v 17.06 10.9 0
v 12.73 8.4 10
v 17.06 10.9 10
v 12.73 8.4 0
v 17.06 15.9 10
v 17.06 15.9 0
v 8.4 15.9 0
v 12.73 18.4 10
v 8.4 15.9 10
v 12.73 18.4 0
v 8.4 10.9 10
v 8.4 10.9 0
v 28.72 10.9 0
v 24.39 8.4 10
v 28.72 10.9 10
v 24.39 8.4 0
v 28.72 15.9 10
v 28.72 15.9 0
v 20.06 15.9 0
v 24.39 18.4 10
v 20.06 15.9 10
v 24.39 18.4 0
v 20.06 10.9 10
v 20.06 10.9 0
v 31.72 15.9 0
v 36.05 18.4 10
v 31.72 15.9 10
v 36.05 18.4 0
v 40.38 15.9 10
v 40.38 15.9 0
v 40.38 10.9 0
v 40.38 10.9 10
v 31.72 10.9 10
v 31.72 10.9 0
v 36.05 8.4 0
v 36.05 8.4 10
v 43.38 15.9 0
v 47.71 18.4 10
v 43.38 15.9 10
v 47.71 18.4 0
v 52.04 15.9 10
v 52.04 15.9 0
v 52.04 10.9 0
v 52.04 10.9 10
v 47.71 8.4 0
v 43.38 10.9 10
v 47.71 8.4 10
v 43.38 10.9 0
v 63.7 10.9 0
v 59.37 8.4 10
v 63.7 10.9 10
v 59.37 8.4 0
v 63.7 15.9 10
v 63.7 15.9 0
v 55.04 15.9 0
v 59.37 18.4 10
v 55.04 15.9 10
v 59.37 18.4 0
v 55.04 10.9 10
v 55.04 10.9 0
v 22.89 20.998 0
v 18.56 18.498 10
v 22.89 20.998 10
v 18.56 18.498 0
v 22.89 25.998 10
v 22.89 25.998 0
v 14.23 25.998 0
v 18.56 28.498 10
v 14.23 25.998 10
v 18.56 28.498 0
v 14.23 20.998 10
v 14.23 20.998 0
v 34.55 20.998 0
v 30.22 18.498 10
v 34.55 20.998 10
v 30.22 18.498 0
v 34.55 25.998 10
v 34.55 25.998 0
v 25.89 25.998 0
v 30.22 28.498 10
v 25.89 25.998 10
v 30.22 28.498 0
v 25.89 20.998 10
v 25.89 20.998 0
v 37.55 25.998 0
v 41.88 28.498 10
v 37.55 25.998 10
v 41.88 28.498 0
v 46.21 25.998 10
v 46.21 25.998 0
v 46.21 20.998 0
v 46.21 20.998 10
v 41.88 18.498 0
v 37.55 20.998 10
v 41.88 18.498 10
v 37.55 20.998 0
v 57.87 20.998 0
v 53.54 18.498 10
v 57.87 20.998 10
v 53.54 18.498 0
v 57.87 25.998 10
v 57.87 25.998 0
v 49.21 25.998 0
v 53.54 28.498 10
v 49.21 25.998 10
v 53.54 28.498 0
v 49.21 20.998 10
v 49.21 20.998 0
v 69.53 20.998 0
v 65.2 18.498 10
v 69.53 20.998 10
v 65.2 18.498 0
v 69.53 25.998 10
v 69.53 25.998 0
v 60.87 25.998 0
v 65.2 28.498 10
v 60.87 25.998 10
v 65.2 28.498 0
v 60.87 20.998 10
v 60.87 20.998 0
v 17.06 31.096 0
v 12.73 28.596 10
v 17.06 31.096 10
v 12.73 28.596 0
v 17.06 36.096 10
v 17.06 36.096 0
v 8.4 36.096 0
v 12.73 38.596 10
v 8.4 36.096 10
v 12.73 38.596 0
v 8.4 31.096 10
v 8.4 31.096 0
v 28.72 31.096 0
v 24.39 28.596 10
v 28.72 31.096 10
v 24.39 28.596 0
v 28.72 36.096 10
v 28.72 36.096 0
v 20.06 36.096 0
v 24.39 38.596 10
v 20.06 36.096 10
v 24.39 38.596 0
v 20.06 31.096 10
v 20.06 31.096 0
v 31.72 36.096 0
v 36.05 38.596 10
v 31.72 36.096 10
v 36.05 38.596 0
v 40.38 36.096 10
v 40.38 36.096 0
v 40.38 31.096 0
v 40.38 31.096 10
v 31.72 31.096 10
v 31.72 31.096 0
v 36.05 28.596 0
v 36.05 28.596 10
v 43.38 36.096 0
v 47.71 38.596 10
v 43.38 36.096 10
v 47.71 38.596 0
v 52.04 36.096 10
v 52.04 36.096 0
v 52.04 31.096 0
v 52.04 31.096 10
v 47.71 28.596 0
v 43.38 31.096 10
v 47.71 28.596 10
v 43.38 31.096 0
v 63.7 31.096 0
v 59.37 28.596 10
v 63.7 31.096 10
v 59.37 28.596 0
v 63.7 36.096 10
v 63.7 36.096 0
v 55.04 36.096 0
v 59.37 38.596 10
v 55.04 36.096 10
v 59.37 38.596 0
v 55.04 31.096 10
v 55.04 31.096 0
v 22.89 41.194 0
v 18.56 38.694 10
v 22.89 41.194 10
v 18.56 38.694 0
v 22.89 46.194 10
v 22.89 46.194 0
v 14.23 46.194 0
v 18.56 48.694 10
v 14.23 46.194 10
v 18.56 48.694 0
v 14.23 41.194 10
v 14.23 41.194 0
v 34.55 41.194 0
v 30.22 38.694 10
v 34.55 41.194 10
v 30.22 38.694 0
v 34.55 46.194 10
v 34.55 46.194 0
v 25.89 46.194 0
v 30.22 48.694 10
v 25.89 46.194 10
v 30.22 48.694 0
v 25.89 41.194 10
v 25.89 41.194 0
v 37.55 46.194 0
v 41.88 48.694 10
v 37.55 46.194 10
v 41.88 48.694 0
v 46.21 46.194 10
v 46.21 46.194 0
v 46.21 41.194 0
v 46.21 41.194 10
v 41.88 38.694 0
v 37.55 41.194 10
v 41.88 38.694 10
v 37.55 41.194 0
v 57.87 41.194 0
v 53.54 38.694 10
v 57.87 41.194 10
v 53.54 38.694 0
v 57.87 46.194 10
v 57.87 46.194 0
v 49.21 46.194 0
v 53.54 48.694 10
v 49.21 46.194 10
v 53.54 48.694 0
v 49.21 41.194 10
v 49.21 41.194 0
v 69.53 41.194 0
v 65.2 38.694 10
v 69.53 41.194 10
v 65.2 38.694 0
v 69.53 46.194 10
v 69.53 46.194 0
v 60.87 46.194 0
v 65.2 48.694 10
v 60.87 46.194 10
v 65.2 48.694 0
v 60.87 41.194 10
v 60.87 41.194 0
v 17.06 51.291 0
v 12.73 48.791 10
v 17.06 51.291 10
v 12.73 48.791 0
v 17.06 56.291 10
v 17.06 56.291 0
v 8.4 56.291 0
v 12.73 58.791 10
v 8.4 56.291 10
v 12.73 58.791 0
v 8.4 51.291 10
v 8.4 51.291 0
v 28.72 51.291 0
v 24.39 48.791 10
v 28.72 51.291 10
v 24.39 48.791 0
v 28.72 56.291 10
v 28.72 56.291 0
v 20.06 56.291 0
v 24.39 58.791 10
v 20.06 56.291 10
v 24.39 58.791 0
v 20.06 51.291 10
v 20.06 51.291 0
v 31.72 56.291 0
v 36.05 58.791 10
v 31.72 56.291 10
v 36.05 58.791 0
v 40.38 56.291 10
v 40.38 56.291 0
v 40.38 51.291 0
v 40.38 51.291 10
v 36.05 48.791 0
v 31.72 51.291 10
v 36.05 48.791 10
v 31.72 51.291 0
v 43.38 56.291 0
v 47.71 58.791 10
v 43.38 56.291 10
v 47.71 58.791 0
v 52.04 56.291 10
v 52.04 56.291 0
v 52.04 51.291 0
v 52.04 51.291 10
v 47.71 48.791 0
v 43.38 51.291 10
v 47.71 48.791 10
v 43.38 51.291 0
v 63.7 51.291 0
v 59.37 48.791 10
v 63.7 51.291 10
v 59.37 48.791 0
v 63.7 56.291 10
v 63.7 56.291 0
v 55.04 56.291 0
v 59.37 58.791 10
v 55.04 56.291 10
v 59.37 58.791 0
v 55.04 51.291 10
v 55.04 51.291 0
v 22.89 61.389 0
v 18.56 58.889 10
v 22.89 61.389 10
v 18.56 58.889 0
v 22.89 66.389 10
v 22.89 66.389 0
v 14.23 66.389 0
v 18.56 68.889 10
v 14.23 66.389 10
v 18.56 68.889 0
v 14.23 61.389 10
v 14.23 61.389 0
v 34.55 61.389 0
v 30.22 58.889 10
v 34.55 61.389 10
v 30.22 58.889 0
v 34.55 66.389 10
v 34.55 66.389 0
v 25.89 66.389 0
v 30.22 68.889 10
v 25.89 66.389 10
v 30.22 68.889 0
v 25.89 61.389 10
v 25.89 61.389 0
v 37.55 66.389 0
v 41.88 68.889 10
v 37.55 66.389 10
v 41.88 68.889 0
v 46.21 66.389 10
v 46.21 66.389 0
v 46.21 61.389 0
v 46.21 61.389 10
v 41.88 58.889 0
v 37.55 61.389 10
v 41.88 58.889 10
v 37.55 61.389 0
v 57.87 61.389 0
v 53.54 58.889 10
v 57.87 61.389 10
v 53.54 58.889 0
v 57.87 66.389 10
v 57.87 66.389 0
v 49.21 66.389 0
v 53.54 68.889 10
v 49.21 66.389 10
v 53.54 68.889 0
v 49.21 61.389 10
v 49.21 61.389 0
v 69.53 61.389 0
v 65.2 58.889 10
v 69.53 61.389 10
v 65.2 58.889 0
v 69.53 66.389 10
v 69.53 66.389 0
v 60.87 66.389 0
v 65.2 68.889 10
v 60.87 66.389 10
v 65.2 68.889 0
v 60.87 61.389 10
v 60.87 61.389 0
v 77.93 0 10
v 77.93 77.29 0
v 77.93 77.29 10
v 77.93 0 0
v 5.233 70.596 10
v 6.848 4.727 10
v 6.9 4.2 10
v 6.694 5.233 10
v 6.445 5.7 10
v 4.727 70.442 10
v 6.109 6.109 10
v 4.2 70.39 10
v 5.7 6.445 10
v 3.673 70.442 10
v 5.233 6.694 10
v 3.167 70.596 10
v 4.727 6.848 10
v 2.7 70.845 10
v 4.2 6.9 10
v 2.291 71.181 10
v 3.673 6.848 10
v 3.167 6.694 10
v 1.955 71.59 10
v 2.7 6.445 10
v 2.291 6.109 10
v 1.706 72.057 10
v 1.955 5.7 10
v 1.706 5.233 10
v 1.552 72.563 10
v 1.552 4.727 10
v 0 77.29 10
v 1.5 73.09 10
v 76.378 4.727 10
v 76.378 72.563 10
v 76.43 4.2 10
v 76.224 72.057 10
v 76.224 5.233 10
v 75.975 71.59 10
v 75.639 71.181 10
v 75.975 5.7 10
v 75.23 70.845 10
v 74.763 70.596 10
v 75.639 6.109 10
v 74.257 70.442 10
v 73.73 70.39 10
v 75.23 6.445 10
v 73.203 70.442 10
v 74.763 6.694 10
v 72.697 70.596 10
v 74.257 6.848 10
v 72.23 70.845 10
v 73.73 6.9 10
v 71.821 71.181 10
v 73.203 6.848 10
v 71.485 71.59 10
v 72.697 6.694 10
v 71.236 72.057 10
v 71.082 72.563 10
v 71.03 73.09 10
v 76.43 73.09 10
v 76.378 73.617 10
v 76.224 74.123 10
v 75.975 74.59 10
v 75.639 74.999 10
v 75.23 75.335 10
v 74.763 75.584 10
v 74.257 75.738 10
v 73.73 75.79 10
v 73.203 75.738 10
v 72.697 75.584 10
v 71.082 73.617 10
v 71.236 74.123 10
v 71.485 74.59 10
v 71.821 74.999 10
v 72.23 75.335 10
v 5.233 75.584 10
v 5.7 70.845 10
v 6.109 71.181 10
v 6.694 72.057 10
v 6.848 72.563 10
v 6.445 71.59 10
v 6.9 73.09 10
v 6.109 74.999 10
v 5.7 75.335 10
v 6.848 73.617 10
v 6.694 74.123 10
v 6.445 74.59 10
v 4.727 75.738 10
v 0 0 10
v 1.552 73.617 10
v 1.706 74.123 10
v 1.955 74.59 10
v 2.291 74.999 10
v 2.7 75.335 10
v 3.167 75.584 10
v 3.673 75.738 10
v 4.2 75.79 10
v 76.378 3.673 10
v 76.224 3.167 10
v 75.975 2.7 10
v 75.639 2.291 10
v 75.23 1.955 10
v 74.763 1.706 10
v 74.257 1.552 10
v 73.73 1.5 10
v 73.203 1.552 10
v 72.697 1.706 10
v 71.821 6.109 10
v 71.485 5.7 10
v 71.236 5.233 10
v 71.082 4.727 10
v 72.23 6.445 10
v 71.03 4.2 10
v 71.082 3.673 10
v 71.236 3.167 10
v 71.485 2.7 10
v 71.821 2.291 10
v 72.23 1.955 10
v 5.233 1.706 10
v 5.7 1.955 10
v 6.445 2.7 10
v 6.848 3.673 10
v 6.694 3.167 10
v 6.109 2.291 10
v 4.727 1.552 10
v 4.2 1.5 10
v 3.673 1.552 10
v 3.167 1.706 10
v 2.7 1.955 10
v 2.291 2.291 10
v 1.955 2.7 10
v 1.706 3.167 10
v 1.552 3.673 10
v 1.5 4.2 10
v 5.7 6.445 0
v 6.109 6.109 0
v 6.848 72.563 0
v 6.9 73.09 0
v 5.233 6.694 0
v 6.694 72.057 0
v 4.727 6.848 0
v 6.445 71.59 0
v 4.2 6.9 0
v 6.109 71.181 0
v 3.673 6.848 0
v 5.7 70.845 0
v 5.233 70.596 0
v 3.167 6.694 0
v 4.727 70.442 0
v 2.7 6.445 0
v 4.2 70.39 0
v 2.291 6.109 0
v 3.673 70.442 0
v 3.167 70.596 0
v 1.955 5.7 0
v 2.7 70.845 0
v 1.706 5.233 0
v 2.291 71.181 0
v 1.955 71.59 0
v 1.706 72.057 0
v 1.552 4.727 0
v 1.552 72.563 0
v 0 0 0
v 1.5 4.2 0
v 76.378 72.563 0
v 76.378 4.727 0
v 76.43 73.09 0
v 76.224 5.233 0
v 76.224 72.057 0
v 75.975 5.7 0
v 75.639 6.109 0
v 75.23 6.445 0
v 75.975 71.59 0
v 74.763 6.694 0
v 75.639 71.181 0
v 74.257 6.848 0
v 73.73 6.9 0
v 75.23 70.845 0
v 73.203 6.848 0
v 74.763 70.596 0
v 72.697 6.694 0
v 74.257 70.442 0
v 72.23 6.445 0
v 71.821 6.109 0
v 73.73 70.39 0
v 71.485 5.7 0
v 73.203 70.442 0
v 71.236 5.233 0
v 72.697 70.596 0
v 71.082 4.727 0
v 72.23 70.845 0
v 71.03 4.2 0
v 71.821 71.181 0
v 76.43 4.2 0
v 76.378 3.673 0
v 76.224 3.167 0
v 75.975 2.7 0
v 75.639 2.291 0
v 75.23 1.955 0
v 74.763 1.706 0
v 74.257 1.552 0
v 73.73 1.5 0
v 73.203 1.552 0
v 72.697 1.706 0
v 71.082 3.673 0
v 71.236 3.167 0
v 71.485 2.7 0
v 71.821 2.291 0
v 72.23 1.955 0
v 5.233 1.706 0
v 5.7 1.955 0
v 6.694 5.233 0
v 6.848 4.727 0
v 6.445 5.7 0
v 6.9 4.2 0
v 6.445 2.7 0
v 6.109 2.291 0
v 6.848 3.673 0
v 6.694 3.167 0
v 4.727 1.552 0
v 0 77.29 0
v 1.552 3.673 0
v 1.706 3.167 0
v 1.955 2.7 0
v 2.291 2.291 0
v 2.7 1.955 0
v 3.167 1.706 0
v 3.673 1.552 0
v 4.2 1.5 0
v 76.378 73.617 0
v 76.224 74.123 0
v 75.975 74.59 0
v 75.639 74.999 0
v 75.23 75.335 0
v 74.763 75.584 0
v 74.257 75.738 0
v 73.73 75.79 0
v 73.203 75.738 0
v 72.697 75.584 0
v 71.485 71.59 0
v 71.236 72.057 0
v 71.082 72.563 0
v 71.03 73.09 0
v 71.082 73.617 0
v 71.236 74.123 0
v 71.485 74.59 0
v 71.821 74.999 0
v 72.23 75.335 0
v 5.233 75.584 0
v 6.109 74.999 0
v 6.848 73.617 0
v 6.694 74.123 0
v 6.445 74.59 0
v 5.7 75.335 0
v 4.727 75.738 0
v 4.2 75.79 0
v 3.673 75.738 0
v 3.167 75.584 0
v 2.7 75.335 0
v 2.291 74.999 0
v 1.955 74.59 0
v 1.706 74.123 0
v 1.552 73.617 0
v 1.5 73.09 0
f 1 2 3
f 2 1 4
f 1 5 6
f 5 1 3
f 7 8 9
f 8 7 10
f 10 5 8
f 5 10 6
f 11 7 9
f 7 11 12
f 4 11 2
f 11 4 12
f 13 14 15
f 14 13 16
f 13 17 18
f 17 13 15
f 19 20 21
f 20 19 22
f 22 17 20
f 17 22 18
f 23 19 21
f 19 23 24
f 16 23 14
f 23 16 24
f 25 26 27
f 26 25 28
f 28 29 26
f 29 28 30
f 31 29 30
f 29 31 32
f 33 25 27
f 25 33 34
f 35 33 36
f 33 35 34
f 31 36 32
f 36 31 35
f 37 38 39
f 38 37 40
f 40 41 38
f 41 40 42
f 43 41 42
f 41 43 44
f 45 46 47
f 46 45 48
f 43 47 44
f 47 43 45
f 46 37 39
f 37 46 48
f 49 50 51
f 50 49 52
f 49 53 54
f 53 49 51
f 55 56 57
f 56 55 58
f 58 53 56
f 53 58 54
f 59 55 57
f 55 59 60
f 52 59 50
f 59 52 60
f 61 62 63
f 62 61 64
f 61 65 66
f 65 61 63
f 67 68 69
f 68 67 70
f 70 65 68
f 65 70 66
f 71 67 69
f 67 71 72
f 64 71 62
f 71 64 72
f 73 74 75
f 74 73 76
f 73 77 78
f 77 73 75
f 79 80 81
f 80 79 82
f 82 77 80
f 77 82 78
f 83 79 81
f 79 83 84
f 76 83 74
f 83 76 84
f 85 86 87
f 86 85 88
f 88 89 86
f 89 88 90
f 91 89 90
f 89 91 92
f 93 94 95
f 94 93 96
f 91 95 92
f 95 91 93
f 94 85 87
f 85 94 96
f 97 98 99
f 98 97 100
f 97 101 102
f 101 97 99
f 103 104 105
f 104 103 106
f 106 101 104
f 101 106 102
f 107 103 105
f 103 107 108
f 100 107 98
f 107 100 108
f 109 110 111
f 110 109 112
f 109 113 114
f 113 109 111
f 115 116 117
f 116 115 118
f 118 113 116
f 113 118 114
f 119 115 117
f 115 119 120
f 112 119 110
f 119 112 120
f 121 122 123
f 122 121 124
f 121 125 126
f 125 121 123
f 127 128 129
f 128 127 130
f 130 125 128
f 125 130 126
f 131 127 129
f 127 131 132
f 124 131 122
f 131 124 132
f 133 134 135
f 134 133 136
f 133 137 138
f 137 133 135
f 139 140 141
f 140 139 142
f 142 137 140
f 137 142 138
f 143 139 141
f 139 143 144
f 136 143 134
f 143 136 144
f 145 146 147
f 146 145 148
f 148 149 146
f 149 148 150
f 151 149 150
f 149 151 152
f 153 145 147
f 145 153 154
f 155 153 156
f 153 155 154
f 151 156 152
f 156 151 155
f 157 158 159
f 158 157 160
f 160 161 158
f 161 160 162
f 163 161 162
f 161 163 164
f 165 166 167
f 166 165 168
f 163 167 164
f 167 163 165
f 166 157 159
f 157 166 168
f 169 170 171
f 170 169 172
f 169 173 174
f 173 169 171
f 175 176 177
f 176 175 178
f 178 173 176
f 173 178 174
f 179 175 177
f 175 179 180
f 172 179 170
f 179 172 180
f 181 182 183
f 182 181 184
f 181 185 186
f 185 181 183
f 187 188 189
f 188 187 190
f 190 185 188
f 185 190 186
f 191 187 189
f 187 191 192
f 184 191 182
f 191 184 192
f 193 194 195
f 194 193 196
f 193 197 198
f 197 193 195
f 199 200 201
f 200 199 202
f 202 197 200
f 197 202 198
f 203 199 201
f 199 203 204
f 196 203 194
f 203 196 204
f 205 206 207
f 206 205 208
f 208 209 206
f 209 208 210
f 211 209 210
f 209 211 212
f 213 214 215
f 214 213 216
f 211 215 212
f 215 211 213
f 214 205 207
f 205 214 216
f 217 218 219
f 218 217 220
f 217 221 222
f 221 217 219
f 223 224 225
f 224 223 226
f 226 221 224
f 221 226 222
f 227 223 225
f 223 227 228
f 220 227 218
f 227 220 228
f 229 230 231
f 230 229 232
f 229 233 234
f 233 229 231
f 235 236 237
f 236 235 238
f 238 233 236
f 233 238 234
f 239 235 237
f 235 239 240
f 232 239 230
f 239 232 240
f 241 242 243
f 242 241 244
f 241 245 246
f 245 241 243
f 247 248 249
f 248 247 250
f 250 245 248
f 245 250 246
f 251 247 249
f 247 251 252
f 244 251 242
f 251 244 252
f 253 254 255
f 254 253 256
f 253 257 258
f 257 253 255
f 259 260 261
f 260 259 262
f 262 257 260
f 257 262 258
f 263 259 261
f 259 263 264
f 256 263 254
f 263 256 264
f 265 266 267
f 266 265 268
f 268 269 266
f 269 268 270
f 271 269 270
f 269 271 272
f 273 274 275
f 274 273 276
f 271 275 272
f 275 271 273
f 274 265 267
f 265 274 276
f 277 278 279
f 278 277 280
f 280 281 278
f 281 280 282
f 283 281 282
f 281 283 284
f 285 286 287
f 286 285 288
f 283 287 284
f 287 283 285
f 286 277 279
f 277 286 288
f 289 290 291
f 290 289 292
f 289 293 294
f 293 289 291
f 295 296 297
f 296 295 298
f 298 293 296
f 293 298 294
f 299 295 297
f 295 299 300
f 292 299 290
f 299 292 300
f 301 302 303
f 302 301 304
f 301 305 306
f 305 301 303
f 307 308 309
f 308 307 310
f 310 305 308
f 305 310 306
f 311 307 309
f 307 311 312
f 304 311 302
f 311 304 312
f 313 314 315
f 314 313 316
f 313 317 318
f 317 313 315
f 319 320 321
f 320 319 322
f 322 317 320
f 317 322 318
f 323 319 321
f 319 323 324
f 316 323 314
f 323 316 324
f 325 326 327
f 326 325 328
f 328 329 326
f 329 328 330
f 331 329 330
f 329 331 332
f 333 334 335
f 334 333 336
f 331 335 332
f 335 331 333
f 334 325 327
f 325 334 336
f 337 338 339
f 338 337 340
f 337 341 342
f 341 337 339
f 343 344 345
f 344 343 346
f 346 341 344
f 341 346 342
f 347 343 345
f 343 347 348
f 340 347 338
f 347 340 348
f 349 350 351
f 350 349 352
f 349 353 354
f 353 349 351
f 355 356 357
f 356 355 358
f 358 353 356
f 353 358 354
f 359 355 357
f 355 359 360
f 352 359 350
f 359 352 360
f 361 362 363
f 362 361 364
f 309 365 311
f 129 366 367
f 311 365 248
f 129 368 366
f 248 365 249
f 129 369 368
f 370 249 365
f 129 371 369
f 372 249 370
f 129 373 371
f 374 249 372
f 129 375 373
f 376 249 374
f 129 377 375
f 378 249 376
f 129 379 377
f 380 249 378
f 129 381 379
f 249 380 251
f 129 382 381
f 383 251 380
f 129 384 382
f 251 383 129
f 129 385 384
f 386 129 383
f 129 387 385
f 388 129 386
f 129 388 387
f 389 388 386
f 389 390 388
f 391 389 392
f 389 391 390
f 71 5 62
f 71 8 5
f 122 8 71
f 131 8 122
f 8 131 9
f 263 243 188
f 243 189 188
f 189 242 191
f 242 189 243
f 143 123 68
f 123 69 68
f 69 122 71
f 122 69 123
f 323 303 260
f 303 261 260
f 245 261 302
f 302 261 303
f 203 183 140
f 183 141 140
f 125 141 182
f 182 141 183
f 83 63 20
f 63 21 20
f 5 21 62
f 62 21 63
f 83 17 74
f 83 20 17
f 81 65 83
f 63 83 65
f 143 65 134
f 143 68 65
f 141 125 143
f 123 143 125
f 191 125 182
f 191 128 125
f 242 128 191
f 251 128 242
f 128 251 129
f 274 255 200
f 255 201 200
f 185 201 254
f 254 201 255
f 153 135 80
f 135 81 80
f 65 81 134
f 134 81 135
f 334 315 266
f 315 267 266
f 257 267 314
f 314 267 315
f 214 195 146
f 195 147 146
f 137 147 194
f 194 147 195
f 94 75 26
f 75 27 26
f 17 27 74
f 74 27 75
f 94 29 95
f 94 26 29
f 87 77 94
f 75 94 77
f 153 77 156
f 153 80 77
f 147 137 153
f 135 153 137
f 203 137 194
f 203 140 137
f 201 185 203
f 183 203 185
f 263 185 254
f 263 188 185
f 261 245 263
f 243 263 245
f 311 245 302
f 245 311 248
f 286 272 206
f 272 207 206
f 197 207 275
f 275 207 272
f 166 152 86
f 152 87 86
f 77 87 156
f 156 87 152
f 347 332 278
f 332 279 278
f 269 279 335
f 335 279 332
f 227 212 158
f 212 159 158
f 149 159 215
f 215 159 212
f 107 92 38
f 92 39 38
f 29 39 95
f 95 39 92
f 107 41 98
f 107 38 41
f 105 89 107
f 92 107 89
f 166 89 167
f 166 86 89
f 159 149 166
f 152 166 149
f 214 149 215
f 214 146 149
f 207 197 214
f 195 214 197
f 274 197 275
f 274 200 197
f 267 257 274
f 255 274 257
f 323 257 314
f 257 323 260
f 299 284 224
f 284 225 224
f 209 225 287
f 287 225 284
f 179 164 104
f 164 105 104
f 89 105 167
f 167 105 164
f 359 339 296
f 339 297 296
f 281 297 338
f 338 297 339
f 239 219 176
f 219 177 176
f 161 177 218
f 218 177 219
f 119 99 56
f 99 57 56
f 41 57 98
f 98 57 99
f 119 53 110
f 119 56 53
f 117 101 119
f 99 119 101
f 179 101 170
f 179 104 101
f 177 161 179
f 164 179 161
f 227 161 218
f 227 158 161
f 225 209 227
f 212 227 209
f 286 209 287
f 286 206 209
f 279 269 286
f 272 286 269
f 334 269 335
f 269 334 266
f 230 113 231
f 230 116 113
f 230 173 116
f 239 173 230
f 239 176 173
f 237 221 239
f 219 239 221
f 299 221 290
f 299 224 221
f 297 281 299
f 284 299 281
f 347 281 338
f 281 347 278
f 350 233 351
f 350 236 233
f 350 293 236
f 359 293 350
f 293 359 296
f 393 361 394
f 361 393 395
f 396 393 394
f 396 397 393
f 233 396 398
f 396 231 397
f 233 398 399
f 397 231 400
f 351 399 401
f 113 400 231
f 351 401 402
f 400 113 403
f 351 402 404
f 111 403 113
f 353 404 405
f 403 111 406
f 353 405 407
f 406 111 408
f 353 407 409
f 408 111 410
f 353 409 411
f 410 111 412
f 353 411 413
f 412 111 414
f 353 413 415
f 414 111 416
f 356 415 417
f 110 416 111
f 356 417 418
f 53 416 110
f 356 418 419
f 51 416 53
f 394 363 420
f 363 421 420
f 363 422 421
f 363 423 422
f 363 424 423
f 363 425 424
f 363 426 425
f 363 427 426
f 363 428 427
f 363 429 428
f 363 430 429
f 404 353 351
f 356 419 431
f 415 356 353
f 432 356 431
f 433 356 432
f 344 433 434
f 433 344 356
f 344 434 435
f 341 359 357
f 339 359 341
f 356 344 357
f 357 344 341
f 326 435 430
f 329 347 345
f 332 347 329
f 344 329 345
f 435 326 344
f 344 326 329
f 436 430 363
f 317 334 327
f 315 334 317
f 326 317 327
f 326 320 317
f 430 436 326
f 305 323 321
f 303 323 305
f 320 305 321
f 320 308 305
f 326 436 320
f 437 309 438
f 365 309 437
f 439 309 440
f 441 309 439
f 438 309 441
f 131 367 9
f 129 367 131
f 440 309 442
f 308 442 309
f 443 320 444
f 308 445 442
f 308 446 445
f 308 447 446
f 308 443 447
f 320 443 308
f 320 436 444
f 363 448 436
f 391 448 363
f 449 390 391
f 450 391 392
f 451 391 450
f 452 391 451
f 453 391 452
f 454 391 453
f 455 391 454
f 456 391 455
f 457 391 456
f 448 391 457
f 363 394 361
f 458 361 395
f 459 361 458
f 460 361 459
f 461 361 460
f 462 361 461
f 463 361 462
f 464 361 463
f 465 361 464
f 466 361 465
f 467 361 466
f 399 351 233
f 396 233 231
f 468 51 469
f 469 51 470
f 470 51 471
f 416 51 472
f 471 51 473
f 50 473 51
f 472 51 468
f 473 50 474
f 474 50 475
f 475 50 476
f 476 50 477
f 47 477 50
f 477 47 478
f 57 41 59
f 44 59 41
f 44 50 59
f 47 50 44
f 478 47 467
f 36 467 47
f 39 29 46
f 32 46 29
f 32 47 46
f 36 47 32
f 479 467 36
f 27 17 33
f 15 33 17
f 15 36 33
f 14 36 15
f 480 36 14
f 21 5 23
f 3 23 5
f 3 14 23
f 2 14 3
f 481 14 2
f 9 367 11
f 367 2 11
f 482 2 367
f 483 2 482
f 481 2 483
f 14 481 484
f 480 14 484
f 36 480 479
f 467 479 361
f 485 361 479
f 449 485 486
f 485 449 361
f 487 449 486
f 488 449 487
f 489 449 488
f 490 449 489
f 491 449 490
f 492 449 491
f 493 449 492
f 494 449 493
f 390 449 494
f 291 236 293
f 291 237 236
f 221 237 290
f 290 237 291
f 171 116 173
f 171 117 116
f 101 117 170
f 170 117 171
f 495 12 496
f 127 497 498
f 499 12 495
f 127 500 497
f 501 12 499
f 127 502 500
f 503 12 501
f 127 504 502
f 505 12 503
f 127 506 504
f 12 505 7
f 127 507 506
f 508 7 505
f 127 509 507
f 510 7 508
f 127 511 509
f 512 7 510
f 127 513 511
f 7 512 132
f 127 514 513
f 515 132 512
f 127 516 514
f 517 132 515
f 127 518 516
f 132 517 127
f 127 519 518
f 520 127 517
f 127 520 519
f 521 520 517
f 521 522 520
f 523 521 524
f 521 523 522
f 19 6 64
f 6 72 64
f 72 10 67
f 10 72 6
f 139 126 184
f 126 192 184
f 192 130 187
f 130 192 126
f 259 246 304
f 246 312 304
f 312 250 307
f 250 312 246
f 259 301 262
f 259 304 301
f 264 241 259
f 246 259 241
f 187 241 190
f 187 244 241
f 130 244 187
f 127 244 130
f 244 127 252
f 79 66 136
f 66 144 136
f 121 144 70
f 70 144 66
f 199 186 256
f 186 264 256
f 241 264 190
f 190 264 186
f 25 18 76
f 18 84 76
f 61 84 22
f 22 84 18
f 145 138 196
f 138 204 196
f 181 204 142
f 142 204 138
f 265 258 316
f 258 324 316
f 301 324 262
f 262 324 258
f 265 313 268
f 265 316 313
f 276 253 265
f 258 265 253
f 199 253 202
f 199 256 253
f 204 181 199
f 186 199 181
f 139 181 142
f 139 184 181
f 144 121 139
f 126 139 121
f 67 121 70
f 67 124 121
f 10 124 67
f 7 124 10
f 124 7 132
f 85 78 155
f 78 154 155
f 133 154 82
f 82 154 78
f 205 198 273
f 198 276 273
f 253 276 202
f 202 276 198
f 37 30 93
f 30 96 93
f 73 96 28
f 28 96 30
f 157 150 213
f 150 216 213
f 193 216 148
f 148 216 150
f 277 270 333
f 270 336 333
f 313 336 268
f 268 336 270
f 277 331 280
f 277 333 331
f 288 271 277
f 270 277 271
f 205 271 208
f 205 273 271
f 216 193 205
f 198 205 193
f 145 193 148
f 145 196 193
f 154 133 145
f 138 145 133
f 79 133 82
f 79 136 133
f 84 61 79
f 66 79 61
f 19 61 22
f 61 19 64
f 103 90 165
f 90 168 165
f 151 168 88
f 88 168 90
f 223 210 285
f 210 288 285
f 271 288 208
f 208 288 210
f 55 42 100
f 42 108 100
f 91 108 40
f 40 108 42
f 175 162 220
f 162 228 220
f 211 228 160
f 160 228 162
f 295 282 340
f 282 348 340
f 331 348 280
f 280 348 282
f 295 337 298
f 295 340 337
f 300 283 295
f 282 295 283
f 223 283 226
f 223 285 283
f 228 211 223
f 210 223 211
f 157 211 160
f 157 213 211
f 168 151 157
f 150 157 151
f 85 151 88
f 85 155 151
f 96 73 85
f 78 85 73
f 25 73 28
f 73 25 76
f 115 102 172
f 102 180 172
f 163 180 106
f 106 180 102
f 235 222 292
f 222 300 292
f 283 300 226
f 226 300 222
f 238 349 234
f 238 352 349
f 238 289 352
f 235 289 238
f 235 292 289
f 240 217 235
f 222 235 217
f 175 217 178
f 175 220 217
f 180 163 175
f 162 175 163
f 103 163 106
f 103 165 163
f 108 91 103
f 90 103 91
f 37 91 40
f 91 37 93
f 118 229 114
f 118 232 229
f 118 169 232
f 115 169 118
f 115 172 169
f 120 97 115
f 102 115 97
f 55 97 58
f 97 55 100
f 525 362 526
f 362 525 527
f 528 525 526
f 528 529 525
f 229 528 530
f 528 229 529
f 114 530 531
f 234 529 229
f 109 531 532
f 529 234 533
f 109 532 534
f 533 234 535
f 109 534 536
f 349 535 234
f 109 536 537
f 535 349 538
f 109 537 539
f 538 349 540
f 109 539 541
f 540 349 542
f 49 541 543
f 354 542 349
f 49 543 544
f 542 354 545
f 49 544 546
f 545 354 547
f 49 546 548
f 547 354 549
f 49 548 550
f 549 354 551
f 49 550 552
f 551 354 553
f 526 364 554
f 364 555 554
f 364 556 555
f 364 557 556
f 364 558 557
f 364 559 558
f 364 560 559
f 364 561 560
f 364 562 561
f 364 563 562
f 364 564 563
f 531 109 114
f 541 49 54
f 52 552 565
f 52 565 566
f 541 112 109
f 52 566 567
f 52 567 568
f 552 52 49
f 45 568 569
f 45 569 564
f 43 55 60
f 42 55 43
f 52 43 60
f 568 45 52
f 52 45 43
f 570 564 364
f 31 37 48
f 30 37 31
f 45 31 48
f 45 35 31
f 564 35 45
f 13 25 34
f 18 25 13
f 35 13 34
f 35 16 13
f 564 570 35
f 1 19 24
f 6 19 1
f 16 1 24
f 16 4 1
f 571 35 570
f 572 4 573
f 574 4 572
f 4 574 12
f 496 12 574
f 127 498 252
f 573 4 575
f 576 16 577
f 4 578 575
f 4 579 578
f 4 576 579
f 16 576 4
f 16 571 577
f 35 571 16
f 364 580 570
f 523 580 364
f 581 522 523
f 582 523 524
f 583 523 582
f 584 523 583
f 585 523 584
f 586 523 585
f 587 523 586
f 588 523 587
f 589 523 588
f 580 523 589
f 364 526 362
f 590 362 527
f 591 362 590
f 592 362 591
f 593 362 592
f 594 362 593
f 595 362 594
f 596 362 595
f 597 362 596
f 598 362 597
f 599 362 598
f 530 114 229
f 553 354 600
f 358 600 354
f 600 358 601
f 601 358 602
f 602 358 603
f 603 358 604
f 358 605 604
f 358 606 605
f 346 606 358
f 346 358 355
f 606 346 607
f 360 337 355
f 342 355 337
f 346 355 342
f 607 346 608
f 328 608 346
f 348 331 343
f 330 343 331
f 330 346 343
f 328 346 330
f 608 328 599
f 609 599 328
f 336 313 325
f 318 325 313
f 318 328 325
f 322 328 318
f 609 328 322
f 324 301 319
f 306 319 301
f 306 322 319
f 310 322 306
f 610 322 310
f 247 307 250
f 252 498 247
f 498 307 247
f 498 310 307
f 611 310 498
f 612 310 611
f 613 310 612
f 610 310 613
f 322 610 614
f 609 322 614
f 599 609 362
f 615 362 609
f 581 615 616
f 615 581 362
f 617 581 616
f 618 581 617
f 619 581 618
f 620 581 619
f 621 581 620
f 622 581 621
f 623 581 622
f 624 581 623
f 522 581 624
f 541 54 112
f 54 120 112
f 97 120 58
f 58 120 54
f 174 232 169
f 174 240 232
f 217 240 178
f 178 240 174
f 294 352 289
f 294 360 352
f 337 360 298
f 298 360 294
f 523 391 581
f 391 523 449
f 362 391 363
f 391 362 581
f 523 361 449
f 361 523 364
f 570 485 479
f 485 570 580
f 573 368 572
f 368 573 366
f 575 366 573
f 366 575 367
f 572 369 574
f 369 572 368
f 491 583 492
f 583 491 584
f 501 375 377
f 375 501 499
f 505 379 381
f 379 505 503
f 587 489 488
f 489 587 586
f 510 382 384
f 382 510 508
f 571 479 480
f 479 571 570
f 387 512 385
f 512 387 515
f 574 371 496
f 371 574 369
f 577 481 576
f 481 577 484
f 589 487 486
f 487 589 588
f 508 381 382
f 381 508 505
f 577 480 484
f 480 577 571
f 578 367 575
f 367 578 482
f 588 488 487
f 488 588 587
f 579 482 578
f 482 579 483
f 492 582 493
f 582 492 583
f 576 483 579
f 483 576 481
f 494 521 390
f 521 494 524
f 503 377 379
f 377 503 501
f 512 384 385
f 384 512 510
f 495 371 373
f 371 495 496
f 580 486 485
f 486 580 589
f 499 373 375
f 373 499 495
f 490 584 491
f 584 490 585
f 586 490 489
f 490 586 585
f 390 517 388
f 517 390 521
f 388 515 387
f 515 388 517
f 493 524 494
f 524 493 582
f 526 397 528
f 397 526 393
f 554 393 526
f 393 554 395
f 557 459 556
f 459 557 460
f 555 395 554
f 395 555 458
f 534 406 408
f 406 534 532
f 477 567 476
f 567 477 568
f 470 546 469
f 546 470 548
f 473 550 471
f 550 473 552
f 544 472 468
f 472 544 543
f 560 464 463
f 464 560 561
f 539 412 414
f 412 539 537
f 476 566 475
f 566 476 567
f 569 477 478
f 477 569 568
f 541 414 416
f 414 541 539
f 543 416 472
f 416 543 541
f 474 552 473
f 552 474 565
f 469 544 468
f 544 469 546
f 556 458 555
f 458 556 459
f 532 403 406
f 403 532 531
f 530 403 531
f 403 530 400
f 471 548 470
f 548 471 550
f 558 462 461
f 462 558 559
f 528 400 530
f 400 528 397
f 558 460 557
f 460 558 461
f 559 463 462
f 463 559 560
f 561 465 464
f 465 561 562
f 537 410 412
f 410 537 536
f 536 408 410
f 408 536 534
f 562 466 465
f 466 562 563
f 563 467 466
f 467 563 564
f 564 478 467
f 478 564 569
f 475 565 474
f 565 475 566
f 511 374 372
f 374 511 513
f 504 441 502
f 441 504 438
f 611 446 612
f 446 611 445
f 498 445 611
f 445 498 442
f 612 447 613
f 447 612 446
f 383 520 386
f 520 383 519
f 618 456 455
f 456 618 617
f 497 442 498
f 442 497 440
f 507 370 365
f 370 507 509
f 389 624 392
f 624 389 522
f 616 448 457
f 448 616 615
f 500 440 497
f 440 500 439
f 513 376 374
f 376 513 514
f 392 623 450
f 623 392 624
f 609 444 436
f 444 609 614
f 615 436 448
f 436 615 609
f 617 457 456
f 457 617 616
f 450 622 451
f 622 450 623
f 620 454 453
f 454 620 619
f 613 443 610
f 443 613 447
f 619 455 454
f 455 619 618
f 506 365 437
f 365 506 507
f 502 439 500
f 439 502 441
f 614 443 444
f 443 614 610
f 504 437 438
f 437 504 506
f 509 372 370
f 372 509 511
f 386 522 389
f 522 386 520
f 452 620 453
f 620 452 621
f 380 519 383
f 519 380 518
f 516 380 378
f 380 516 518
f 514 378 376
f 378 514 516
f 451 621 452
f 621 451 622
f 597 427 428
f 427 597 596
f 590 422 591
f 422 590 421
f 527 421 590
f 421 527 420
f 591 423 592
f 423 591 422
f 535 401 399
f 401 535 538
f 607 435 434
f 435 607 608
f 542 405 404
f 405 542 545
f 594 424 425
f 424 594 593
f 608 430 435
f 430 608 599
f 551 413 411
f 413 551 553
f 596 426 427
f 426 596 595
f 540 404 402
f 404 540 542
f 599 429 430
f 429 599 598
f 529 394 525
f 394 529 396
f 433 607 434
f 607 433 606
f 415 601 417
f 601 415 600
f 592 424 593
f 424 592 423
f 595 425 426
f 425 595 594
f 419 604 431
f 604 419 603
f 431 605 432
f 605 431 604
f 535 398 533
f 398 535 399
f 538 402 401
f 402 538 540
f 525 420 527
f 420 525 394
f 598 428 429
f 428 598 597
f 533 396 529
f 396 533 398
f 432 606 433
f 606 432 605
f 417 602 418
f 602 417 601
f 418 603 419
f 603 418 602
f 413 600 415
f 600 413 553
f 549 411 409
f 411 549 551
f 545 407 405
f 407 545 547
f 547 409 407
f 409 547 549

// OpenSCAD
$fn = 32;

// ----------------------------------------------------------------------
// Honeycomb panel: 77.93 x 77.29 mm, 30 cells of 10 mm
// ----------------------------------------------------------------------

// --- parameters (mm) ---
panel_w = 77.93;          // panel width
panel_d = 77.29;          // panel depth
thick = 10;               // panel thickness
cell_r = 5;               // hex cell circumradius
pitch = 11.66;            // hex cell pitch (centre to centre)
web = 3;                  // web between the cells
columns = 5;              // columns of cells
rows = 6;                 // rows of cells
cell_count = 30;          // total cells
shift_x = 12.73;          // first cell offset in x
shift_y = 13.4;           // first cell offset in y
mount_d = 5.4;            // corner mounting holes
hole_off = 4.2;           // mounting hole offset from the corners

difference() {
  union() {
    cube([panel_w, panel_d, thick]);
  }
  /* hexagonal cells, point-up, cut right through the plate */
  for (row = [0 : rows - 1]) {
    for (col = [0 : columns - 1]) {
      translate([shift_x + col * pitch + (row % 2) * pitch / 2, shift_y + row * pitch * 0.866025, -2.5]) rotate([0, 0, 30]) cylinder(h = thick + 5, d = 2 * cell_r, $fn = 6);
    }
  }
  /* corner mounting holes, clear of the outer cell web */
  translate([4.2, 4.2, -2.5]) cylinder(h = thick + 5, d = mount_d);
  translate([73.73, 4.2, -2.5]) cylinder(h = thick + 5, d = mount_d);
  translate([4.2, 73.09, -2.5]) cylinder(h = thick + 5, d = mount_d);
  translate([73.73, 73.09, -2.5]) cylinder(h = thick + 5, d = mount_d);
}
